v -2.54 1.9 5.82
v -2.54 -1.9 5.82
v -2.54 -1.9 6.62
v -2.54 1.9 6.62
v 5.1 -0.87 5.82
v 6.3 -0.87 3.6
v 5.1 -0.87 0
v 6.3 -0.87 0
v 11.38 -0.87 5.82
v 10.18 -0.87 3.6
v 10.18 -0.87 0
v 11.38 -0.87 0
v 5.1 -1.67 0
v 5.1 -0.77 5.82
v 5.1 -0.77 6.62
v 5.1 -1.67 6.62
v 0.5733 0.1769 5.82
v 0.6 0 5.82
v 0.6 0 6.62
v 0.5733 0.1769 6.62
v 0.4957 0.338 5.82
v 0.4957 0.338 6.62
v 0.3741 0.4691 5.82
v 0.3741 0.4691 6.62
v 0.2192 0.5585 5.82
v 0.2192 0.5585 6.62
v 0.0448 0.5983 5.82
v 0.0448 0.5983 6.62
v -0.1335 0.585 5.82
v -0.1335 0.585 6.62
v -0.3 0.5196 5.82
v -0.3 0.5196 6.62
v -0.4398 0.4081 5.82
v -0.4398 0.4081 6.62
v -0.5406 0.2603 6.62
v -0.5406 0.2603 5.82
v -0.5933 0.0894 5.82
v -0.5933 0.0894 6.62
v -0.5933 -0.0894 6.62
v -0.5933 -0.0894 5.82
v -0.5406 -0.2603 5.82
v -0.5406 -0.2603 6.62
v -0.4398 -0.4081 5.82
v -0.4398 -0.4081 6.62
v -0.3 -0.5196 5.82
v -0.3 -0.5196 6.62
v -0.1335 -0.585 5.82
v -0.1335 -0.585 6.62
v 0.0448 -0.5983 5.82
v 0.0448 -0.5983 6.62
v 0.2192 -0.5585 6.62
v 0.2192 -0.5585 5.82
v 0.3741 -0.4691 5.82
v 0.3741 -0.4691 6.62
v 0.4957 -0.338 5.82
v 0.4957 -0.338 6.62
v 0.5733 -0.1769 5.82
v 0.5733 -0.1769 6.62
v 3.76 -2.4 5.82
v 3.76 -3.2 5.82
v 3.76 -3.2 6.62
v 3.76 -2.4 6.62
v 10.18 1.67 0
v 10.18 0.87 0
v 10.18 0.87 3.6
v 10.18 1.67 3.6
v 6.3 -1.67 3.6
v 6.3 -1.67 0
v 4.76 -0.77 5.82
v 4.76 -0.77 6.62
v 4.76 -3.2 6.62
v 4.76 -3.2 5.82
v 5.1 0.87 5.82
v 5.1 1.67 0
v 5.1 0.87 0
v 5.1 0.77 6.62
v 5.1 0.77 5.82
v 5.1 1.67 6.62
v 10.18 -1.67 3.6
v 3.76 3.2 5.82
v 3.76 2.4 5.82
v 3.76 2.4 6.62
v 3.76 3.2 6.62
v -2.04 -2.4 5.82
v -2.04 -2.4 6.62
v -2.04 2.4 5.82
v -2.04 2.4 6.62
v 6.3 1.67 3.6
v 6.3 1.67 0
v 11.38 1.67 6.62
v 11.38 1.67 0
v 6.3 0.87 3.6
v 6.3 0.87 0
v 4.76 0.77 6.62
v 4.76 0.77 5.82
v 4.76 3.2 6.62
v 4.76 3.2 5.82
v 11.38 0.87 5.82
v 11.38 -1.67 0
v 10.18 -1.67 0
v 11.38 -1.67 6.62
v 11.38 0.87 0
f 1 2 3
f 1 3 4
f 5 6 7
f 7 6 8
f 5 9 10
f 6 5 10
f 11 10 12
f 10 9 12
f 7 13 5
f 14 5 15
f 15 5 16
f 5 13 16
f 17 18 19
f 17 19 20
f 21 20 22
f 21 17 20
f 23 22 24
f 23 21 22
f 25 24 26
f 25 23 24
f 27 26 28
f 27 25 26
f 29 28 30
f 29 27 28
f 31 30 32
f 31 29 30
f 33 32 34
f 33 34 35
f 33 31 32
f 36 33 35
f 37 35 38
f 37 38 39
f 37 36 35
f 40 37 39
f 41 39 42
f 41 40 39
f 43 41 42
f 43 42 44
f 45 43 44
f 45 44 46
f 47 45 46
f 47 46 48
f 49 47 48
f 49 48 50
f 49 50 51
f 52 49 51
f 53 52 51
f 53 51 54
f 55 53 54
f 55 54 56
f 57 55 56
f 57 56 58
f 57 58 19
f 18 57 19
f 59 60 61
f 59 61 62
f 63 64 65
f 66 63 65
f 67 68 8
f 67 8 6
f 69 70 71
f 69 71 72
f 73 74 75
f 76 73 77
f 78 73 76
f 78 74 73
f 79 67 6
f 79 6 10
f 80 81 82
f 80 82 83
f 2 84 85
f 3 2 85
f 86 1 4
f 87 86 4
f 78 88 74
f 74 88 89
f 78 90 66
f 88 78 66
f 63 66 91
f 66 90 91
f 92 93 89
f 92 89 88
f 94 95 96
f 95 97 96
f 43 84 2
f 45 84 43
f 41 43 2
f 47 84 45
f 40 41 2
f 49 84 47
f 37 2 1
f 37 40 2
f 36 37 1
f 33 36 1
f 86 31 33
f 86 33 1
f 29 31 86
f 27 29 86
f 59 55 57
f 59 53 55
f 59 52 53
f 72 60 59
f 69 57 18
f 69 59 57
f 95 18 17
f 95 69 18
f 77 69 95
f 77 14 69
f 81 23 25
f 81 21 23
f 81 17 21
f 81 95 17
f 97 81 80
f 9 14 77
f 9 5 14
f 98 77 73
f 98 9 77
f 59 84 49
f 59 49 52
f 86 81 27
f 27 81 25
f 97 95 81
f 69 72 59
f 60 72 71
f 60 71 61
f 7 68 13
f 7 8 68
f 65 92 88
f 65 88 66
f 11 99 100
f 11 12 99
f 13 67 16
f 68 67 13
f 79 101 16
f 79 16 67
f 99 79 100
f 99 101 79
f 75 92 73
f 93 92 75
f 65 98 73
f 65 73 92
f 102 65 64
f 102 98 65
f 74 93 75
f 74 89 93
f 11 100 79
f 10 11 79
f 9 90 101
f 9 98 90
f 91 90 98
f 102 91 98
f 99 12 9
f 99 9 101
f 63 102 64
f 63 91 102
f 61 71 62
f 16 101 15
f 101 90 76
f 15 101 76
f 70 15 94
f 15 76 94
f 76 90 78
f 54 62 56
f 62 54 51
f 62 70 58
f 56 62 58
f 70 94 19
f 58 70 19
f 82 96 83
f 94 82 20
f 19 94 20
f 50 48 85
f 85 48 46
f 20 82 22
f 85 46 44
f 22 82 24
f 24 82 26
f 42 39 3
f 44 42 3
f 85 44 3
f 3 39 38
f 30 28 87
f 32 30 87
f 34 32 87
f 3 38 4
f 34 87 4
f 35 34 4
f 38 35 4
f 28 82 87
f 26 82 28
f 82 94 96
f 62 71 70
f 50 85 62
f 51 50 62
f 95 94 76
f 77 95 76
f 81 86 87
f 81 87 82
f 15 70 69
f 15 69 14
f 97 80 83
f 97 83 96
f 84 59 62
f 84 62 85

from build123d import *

# Parameters (mm, degrees)
SKETCH1_R           = 0.6
BOSS_EXTRUDE1_DEPTH = 6.62
SKETCH2_W           = 5.82
SKETCH2_H           = 1.74
SKETCH2_H_2         = 1.53
CUT_EXTRUDE1_DEPTH  = 14.92
SKETCH5_W           = 0.8
SKETCH5_H           = 1.53
CUT_EXTRUDE4_DEPTH  = 6.62
SKETCH4_W           = 7.64
SKETCH4_H           = 5.82
SKETCH4_W_2         = 3.88
SKETCH4_H_2         = 3.6
CUT_EXTRUDE3_DEPTH  = 7.4
CHAMFER1_SIZE       = 0.5
SKETCH11_W          = 0.34
SKETCH11_H          = 0.8
CUT_EXTRUDE5_DEPTH  = 0.9


with BuildPart() as part:
    # Sketch1 → Boss-Extrude1 (new body)
    with BuildSketch(Plane.XY):
        Polygon((3.76, 2.4), (3.76, 3.2), (11.38, 3.2), (11.38, -3.2), (3.76, -3.2), (3.76, -2.4), (-2.54, -2.4), (-2.54, 2.4), align=None)
        Circle(SKETCH1_R, mode=Mode.SUBTRACT)
    extrude(amount=BOSS_EXTRUDE1_DEPTH)

    # Sketch2 → Cut-Extrude1 (cut, through all)
    with BuildSketch(Plane(origin=(11.38, 0, 0), x_dir=(0, 0, -1), z_dir=(1, 0, 0))):
        with Locations((-2.91, 0)):
            Rectangle(SKETCH2_W, SKETCH2_H)
        with Locations((-2.91, 2.435)):
            Rectangle(SKETCH2_W, SKETCH2_H_2)
        with Locations((-2.91, -2.435)):
            Rectangle(SKETCH2_W, SKETCH2_H_2)
    extrude(amount=-CUT_EXTRUDE1_DEPTH, mode=Mode.SUBTRACT)

    # Sketch5 → Cut-Extrude4 (cut)
    with BuildSketch(Plane(origin=(11.38, 0, 0), x_dir=(0, 0, -1), z_dir=(1, 0, 0))):
        with Locations((-6.22, 2.435)):
            Rectangle(SKETCH5_W, SKETCH5_H)
        with Locations((-6.22, -2.435)):
            Rectangle(SKETCH5_W, SKETCH5_H)
    extrude(amount=-CUT_EXTRUDE4_DEPTH, mode=Mode.SUBTRACT)

    # Sketch4 → Cut-Extrude3 (cut, through all)
    with BuildSketch(Plane.XZ.offset(3.2)):
        with Locations((1.28, 2.91)):
            Rectangle(SKETCH4_W, SKETCH4_H)
        with Locations((8.24, 1.8)):
            Rectangle(SKETCH4_W_2, SKETCH4_H_2)
    extrude(amount=-CUT_EXTRUDE3_DEPTH, mode=Mode.SUBTRACT)

    # Chamfer1
    chamfer1_edges = [part.edges().sort_by_distance(p)[0] for p in [
        (-2.54, 2.4, 6.22),
        (-2.54, -2.4, 6.22),
    ]]
    chamfer(chamfer1_edges, length=CHAMFER1_SIZE)

    # Sketch11 → Cut-Extrude5 (cut)
    with BuildSketch(Plane.XZ.offset(1.67)):
        with Locations((4.93, 6.22)):
            Rectangle(SKETCH11_W, SKETCH11_H)
    cut_extrude5 = extrude(amount=-CUT_EXTRUDE5_DEPTH, mode=Mode.SUBTRACT)

    # Mirror1: Cut-Extrude5 across plane
    add(cut_extrude5.mirror(Plane.ZX), mode=Mode.SUBTRACT)


solid = part.part
